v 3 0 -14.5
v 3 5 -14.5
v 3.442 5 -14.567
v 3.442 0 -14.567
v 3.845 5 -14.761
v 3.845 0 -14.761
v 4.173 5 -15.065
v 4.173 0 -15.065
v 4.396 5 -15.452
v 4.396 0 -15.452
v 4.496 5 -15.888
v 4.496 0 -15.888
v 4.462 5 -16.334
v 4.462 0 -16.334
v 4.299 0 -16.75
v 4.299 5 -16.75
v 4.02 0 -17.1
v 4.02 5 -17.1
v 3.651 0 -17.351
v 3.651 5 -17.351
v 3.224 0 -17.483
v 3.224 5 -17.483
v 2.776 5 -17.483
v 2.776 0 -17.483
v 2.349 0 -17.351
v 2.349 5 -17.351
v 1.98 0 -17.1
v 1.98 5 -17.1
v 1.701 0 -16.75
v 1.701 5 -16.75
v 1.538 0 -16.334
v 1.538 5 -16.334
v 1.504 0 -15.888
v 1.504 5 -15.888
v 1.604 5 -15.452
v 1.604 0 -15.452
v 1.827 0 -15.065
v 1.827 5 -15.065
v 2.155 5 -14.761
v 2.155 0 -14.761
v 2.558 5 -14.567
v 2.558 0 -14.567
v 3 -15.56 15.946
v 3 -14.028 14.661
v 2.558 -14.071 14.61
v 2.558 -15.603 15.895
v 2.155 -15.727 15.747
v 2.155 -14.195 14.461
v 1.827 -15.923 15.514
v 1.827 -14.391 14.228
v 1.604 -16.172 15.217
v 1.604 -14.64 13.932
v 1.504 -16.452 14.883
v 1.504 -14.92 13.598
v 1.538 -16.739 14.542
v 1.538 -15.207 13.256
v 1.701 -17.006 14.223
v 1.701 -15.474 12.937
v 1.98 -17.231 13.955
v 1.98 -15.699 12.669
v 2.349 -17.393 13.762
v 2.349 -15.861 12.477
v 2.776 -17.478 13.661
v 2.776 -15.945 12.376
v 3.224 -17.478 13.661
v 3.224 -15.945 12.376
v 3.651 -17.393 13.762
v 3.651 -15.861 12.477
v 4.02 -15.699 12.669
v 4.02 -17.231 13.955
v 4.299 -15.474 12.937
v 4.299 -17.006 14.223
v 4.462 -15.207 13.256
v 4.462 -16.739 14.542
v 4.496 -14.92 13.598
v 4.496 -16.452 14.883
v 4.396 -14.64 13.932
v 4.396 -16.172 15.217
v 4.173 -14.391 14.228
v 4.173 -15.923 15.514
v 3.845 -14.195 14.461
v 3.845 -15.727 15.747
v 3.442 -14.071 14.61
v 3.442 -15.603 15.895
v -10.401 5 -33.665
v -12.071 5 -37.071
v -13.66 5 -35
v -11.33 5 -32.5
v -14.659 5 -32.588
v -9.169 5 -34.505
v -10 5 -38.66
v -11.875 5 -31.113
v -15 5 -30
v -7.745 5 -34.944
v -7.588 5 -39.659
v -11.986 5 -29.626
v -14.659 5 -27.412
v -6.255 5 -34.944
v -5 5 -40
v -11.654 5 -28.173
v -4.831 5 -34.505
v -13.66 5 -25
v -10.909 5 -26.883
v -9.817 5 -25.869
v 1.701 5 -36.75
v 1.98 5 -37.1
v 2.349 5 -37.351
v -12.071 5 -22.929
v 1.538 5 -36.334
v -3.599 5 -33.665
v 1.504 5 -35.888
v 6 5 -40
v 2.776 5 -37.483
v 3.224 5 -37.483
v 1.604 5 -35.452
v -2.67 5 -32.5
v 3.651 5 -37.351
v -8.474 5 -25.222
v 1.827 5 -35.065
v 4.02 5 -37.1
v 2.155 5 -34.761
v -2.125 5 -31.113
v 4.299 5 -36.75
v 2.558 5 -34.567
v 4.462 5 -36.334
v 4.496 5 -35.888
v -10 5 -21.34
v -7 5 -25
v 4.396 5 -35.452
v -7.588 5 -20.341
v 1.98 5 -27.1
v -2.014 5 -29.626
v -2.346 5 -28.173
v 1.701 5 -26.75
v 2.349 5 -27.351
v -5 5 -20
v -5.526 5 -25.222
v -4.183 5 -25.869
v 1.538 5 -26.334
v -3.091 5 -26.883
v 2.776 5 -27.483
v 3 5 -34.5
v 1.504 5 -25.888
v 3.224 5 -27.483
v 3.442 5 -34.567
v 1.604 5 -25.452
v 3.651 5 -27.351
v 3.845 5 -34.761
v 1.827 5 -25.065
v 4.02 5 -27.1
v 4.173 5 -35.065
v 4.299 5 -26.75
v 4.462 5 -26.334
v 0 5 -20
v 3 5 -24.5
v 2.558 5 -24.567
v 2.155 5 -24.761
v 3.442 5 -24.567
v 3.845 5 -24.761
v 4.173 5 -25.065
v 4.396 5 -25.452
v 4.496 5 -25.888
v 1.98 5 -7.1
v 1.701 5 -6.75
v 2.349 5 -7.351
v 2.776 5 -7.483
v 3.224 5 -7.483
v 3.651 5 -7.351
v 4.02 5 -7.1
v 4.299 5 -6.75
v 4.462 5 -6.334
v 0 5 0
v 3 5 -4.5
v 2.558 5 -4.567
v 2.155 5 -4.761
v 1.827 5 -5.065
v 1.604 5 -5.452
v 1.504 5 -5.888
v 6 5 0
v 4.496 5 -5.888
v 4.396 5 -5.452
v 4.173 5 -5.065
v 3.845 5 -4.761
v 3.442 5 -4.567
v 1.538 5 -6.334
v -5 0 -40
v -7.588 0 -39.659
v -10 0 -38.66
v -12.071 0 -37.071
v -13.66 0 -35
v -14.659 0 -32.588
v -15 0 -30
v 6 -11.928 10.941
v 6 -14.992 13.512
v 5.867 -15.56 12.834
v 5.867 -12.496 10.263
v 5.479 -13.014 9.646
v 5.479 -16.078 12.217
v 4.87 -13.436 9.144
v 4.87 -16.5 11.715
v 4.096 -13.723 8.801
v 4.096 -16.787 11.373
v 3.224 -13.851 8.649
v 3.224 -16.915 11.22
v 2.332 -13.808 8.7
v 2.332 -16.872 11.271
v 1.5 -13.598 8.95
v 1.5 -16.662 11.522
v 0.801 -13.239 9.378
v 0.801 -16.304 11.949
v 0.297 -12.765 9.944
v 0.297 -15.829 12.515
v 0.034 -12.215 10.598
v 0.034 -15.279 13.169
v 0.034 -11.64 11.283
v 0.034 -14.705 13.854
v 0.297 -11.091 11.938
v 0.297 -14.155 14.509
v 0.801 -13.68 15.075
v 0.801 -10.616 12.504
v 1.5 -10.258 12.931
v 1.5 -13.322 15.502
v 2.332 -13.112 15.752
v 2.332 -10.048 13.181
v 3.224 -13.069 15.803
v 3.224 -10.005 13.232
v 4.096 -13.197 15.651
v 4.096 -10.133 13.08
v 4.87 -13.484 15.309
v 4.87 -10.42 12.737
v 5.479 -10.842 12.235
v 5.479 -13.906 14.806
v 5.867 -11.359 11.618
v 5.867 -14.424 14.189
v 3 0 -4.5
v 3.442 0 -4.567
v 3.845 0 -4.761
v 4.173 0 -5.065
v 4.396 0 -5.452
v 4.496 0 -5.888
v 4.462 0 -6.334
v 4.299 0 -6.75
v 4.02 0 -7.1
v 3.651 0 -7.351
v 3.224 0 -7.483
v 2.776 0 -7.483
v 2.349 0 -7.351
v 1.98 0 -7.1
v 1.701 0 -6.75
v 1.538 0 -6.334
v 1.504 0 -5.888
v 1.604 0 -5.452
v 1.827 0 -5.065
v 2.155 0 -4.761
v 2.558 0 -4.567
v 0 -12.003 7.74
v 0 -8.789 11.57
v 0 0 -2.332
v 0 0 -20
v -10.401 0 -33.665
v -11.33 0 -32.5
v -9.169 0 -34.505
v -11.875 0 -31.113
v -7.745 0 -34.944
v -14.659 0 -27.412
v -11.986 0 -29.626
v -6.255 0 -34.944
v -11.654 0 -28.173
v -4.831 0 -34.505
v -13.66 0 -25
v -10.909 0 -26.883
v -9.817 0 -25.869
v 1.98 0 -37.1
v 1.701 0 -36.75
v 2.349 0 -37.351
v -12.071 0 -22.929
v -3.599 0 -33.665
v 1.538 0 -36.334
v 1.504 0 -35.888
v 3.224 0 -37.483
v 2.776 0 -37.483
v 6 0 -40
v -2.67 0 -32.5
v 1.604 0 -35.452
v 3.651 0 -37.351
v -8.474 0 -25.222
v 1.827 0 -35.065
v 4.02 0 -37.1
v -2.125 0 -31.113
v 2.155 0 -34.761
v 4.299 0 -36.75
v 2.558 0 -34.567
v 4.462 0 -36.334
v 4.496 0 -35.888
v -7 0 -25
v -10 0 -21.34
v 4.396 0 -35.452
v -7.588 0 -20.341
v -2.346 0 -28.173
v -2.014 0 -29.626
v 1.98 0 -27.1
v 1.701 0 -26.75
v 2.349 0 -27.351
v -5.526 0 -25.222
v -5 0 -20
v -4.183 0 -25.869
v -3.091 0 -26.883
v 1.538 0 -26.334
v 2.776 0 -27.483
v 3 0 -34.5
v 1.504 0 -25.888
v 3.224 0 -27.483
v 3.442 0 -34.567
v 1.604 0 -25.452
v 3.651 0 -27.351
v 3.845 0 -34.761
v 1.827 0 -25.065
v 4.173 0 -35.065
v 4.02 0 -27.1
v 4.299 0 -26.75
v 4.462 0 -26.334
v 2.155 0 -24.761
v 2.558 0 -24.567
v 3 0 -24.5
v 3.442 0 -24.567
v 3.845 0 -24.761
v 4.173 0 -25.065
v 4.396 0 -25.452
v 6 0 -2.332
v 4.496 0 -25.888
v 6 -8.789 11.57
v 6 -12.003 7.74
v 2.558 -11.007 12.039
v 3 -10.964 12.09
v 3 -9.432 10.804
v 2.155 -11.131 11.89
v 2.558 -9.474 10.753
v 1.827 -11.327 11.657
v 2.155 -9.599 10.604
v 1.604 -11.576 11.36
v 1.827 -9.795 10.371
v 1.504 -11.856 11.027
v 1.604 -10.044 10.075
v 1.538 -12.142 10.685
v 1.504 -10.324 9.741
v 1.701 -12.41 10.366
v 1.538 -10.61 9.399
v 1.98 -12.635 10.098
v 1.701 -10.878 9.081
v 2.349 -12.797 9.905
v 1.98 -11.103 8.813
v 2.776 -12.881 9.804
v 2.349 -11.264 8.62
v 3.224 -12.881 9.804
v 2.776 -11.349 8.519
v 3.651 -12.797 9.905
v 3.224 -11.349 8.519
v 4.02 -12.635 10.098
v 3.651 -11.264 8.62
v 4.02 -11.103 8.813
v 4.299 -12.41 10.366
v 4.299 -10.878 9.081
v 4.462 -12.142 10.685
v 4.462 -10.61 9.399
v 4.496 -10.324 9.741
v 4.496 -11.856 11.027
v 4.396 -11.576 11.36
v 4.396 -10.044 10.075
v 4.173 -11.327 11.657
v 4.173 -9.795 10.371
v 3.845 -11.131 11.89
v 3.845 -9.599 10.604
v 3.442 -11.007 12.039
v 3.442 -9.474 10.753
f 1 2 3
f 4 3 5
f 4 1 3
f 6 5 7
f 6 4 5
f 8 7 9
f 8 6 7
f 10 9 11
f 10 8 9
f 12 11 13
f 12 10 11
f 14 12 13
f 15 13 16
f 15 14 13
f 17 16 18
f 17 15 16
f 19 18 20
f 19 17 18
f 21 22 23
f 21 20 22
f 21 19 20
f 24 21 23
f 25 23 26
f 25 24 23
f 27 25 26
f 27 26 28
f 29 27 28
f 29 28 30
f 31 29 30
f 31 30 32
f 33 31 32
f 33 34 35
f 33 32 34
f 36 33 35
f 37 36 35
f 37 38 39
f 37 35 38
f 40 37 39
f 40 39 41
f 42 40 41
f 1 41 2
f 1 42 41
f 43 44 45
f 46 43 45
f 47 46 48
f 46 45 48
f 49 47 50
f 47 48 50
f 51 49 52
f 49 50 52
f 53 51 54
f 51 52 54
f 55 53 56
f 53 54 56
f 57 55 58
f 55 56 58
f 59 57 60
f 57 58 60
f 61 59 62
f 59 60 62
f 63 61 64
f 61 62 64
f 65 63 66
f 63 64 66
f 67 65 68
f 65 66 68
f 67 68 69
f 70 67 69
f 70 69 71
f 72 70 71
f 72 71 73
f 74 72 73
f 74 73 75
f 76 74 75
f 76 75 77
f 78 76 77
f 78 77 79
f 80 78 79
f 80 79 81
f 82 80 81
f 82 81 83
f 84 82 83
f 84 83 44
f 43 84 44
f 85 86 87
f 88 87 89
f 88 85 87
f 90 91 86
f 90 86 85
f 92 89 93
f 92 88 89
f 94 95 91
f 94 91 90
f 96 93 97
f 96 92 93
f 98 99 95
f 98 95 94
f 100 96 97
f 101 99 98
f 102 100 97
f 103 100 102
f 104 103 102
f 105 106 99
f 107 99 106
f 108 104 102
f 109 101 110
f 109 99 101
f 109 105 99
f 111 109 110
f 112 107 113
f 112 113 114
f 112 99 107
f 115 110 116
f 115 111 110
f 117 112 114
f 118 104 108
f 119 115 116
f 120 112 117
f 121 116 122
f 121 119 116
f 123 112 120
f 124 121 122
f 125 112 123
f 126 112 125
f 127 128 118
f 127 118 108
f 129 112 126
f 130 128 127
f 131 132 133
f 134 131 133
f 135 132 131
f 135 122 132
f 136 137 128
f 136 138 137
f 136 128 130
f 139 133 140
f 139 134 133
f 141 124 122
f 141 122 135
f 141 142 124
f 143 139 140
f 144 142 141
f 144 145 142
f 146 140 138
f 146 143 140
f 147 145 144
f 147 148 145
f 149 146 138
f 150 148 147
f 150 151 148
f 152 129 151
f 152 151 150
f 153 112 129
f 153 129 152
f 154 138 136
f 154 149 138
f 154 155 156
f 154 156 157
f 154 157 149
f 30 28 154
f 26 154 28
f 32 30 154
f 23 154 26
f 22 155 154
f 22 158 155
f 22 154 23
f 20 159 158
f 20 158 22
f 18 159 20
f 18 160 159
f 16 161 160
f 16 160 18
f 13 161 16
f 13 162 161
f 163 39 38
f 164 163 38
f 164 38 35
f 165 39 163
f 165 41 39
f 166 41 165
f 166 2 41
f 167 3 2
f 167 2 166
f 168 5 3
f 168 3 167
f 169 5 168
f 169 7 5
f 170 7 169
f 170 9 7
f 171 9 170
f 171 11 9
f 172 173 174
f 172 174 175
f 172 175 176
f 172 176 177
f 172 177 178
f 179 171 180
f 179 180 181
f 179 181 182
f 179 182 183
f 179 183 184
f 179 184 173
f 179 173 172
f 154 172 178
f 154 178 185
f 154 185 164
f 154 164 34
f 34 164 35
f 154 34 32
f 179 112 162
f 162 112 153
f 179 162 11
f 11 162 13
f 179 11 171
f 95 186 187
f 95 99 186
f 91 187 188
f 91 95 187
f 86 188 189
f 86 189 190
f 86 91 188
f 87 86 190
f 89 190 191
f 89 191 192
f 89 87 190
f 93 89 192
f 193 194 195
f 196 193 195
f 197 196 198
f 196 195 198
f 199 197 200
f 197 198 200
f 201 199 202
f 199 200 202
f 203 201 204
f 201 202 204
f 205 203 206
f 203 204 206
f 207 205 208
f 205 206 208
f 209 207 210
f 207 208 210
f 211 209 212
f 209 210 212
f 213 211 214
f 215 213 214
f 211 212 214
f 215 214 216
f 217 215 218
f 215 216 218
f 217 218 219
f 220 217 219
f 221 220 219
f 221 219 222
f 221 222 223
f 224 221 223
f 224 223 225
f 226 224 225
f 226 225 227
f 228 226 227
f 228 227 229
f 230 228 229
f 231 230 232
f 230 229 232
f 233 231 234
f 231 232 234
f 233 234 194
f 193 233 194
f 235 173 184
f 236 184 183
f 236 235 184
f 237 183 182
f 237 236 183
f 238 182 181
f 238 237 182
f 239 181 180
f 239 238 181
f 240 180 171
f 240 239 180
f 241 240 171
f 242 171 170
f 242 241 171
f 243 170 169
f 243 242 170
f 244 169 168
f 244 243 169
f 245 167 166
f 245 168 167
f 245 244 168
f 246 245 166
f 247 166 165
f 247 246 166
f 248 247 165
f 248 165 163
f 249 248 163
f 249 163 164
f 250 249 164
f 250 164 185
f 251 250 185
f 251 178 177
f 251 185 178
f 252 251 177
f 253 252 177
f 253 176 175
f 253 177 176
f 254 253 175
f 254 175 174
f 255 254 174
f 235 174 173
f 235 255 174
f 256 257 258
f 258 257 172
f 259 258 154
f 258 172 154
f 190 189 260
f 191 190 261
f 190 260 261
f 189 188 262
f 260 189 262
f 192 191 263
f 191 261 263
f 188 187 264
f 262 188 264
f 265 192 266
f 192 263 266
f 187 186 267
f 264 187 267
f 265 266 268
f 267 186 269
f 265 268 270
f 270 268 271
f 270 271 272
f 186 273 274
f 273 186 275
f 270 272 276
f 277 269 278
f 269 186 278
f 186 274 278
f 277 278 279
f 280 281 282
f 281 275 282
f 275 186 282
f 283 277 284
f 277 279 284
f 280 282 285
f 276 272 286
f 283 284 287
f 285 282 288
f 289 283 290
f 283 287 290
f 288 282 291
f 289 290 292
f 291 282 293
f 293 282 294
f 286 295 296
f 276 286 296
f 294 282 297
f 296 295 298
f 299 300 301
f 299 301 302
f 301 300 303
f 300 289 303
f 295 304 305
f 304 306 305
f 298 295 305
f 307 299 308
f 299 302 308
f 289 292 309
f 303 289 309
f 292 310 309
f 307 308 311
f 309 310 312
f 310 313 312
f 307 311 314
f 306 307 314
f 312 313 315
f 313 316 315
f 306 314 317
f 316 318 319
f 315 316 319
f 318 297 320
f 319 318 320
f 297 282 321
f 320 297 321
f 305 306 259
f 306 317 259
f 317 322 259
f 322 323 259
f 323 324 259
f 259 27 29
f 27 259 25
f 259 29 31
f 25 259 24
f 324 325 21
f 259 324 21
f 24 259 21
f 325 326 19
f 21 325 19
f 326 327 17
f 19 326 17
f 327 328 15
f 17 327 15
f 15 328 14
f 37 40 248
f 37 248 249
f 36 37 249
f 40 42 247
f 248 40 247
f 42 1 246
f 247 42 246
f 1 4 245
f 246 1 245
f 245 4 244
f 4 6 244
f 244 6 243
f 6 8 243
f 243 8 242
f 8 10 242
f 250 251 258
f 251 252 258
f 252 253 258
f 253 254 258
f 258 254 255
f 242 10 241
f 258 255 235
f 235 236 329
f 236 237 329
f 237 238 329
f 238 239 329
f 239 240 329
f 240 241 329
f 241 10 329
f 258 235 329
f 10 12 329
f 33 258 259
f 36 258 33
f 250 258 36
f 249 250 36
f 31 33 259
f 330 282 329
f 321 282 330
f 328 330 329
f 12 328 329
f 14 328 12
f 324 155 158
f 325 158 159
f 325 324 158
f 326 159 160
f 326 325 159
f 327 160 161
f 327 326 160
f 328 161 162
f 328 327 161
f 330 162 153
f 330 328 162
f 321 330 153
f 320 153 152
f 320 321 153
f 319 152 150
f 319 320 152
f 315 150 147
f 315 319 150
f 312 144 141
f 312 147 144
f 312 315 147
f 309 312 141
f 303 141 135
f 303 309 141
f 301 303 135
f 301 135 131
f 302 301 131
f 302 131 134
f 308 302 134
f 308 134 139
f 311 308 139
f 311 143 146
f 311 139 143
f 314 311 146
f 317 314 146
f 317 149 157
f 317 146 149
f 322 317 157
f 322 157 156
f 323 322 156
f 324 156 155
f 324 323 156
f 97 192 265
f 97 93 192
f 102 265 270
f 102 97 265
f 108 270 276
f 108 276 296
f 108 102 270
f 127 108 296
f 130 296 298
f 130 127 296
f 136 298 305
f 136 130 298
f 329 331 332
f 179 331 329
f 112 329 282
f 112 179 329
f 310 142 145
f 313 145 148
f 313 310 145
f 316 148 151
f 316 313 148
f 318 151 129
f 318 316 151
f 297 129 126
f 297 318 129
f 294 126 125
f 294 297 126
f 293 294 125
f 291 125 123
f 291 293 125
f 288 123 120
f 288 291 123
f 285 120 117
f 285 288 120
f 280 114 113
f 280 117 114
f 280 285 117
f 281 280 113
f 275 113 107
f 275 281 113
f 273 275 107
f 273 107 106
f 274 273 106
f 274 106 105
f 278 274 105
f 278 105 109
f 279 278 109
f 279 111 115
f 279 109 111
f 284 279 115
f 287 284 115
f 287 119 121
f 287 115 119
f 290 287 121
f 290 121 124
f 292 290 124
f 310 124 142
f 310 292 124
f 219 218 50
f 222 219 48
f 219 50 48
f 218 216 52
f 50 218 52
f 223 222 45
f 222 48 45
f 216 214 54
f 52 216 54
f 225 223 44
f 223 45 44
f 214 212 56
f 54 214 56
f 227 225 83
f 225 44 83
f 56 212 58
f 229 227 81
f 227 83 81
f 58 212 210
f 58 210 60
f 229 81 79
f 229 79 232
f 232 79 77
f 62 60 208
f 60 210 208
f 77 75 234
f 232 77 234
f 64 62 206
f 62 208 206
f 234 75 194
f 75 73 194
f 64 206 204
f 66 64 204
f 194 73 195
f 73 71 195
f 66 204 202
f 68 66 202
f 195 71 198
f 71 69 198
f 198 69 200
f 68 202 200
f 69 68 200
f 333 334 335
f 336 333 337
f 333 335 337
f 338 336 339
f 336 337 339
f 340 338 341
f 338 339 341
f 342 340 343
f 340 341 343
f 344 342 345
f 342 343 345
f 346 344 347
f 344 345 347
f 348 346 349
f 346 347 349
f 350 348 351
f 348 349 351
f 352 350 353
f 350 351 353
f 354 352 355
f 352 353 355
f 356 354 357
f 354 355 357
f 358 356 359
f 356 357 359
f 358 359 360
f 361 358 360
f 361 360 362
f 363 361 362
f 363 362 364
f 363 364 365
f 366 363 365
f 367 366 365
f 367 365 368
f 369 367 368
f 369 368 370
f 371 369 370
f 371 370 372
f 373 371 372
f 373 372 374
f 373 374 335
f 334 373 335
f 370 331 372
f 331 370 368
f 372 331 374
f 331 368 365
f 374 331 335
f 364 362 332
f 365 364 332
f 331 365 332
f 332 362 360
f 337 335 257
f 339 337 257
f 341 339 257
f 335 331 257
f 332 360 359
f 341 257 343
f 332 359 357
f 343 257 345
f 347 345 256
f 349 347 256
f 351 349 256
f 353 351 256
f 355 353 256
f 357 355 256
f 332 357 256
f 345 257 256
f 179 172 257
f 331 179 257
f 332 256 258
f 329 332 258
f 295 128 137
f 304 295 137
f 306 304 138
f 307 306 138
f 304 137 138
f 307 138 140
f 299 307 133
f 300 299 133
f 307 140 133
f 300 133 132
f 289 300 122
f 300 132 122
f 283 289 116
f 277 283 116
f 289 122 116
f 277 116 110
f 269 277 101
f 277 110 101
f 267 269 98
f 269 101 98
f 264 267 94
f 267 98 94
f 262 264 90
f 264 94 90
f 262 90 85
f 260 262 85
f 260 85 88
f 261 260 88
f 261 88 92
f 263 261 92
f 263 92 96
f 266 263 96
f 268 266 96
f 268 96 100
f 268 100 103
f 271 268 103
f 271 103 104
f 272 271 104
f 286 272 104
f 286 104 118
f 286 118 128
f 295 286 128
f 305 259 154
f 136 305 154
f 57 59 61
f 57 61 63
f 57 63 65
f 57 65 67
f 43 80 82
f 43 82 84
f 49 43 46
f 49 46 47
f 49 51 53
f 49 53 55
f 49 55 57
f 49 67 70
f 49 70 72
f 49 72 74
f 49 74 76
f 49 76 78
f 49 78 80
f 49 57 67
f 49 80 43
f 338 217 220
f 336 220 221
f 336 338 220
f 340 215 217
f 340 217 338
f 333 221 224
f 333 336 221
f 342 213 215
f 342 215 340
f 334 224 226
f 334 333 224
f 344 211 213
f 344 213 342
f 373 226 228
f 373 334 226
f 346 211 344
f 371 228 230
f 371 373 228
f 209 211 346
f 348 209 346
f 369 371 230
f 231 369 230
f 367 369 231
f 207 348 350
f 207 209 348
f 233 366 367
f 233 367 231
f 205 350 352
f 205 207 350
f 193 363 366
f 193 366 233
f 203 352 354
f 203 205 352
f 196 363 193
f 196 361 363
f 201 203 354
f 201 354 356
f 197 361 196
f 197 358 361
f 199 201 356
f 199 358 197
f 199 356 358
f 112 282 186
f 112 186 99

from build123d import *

# Parameters (mm, degrees)
SKETCH1_W                 = 6
SKETCH1_H                 = 40
BOSS_EXTRUDE1_DEPTH       = 5
SKETCH3_R                 = 1.5
CUT_EXTRUDE1_DEPTH        = 41.755367745
LPATTERN1_COUNT           = 4
LPATTERN1_PITCH           = 10
BOSS_EXTRUDE3_DEPTH       = 6
SKETCH12_R                = 1.5
BOSS_EXTRUDE7_DEPTH       = 8
SKETCH10_W                = 20
SKETCH10_H                = 5
BOSS_EXTRUDE6_DEPTH       = 15
CUT_EXTRUDE2_REACH        = 50.278
SKETCH11_R                = 5
FILLET1_R                 = 10
BOSS_EXTRUDE8_START       = -20.169777786
BOSS_EXTRUDE8_OUTLINE_R   = 3
BOSS_EXTRUDE8_OUTLINE_R_2 = 1.5
BOSS_EXTRUDE8_DEPTH       = 4


# Read off the part's stored shape, not the designer's step: Boss-Extrude8
with BuildPart() as part:
    # Sketch1 → Boss-Extrude1 (new body)
    with BuildSketch(Plane(origin=(0, 0, 0), x_dir=(1, 0, 0), z_dir=(0, 1, 0))):
        with Locations((3, 20)):
            Rectangle(SKETCH1_W, SKETCH1_H)
    extrude(amount=BOSS_EXTRUDE1_DEPTH)

    # Sketch3 → Cut-Extrude1 (cut, through all)
    with BuildSketch(Plane(origin=(0, 0, 0), x_dir=(1, 0, 0), z_dir=(0, 1, 0))):
        with Locations(Location((3, 6, 0), (0, 0, 270))):
            Circle(SKETCH3_R)
    cut_extrude1 = extrude(amount=CUT_EXTRUDE1_DEPTH, mode=Mode.SUBTRACT)

    # LPattern1: Cut-Extrude1 ×4
    with Locations(*[(0, 0, -i * LPATTERN1_PITCH) for i in range(1, LPATTERN1_COUNT)]):
        add(cut_extrude1, mode=Mode.SUBTRACT)

    # Sketch4 → Boss-Extrude3 (add)
    with BuildSketch(Plane(origin=(0, 0, 0), x_dir=(0, 0, -1), z_dir=(1, 0, 0))):
        Polygon((-11.570176974, -8.788799976), (-7.739954759, -12.002738025), (3.830222216, 1.786061952), (0, 5), align=None)
    extrude(amount=BOSS_EXTRUDE3_DEPTH)

    # Sketch12 → Boss-Extrude7 (add)
    with BuildSketch(Plane(origin=(0, -10.854679532, 9.108157592), x_dir=(1, 0, 0), z_dir=(0, -0.7660444431189747, 0.6427876096865434))):
        with Locations(Location((3, 0.713938048, 0), (0, 0, 90))):
            Circle(SKETCH12_R)
    extrude(amount=BOSS_EXTRUDE7_DEPTH)

    # Sketch10 → Boss-Extrude6 (add)
    with BuildSketch(Plane.ZY):
        with Locations((-30, 2.5)):
            Rectangle(SKETCH10_W, SKETCH10_H)
    extrude(amount=BOSS_EXTRUDE6_DEPTH)

    # Sketch11 → Cut-Extrude2 (cut, up to next)
    with BuildSketch(Plane(origin=(0, 5, 0), x_dir=(1, 0, 0), z_dir=(0, 1, 0)), mode=Mode.PRIVATE) as cut_extrude2_sk1:
        with Locations(Location((-7, 30, 0), (0, 0, 270))):
            Circle(SKETCH11_R)
    cut_extrude2_tool1 = extrude(cut_extrude2_sk1.sketch, amount=-CUT_EXTRUDE2_REACH, mode=Mode.PRIVATE) & part.part
    add(cut_extrude2_tool1.solids().sort_by_distance((-7, 5, -30))[0], mode=Mode.SUBTRACT)

    # Fillet1
    fillet1_edges = [part.edges().sort_by_distance(p)[0] for p in [
        (-15, 2.5, -40),
        (-15, 2.5, -20),
    ]]
    fillet(fillet1_edges, radius=FILLET1_R - 0.0001)  # a hair under: the kernel refuses the full size

    # Boss-Extrude8 outline → Boss-Extrude8 (add)
    with BuildSketch(Plane(origin=(0, 0, 0), x_dir=(1, 0, 0), z_dir=(0, 0.766044443118975, -0.642787609686543)).offset(BOSS_EXTRUDE8_START)):
        with Locations((3, -0.713938048)):
            Circle(BOSS_EXTRUDE8_OUTLINE_R)
        with Locations((3, -0.713938048)):
            Circle(BOSS_EXTRUDE8_OUTLINE_R_2, mode=Mode.SUBTRACT)
    extrude(amount=BOSS_EXTRUDE8_DEPTH)


solid = part.part
